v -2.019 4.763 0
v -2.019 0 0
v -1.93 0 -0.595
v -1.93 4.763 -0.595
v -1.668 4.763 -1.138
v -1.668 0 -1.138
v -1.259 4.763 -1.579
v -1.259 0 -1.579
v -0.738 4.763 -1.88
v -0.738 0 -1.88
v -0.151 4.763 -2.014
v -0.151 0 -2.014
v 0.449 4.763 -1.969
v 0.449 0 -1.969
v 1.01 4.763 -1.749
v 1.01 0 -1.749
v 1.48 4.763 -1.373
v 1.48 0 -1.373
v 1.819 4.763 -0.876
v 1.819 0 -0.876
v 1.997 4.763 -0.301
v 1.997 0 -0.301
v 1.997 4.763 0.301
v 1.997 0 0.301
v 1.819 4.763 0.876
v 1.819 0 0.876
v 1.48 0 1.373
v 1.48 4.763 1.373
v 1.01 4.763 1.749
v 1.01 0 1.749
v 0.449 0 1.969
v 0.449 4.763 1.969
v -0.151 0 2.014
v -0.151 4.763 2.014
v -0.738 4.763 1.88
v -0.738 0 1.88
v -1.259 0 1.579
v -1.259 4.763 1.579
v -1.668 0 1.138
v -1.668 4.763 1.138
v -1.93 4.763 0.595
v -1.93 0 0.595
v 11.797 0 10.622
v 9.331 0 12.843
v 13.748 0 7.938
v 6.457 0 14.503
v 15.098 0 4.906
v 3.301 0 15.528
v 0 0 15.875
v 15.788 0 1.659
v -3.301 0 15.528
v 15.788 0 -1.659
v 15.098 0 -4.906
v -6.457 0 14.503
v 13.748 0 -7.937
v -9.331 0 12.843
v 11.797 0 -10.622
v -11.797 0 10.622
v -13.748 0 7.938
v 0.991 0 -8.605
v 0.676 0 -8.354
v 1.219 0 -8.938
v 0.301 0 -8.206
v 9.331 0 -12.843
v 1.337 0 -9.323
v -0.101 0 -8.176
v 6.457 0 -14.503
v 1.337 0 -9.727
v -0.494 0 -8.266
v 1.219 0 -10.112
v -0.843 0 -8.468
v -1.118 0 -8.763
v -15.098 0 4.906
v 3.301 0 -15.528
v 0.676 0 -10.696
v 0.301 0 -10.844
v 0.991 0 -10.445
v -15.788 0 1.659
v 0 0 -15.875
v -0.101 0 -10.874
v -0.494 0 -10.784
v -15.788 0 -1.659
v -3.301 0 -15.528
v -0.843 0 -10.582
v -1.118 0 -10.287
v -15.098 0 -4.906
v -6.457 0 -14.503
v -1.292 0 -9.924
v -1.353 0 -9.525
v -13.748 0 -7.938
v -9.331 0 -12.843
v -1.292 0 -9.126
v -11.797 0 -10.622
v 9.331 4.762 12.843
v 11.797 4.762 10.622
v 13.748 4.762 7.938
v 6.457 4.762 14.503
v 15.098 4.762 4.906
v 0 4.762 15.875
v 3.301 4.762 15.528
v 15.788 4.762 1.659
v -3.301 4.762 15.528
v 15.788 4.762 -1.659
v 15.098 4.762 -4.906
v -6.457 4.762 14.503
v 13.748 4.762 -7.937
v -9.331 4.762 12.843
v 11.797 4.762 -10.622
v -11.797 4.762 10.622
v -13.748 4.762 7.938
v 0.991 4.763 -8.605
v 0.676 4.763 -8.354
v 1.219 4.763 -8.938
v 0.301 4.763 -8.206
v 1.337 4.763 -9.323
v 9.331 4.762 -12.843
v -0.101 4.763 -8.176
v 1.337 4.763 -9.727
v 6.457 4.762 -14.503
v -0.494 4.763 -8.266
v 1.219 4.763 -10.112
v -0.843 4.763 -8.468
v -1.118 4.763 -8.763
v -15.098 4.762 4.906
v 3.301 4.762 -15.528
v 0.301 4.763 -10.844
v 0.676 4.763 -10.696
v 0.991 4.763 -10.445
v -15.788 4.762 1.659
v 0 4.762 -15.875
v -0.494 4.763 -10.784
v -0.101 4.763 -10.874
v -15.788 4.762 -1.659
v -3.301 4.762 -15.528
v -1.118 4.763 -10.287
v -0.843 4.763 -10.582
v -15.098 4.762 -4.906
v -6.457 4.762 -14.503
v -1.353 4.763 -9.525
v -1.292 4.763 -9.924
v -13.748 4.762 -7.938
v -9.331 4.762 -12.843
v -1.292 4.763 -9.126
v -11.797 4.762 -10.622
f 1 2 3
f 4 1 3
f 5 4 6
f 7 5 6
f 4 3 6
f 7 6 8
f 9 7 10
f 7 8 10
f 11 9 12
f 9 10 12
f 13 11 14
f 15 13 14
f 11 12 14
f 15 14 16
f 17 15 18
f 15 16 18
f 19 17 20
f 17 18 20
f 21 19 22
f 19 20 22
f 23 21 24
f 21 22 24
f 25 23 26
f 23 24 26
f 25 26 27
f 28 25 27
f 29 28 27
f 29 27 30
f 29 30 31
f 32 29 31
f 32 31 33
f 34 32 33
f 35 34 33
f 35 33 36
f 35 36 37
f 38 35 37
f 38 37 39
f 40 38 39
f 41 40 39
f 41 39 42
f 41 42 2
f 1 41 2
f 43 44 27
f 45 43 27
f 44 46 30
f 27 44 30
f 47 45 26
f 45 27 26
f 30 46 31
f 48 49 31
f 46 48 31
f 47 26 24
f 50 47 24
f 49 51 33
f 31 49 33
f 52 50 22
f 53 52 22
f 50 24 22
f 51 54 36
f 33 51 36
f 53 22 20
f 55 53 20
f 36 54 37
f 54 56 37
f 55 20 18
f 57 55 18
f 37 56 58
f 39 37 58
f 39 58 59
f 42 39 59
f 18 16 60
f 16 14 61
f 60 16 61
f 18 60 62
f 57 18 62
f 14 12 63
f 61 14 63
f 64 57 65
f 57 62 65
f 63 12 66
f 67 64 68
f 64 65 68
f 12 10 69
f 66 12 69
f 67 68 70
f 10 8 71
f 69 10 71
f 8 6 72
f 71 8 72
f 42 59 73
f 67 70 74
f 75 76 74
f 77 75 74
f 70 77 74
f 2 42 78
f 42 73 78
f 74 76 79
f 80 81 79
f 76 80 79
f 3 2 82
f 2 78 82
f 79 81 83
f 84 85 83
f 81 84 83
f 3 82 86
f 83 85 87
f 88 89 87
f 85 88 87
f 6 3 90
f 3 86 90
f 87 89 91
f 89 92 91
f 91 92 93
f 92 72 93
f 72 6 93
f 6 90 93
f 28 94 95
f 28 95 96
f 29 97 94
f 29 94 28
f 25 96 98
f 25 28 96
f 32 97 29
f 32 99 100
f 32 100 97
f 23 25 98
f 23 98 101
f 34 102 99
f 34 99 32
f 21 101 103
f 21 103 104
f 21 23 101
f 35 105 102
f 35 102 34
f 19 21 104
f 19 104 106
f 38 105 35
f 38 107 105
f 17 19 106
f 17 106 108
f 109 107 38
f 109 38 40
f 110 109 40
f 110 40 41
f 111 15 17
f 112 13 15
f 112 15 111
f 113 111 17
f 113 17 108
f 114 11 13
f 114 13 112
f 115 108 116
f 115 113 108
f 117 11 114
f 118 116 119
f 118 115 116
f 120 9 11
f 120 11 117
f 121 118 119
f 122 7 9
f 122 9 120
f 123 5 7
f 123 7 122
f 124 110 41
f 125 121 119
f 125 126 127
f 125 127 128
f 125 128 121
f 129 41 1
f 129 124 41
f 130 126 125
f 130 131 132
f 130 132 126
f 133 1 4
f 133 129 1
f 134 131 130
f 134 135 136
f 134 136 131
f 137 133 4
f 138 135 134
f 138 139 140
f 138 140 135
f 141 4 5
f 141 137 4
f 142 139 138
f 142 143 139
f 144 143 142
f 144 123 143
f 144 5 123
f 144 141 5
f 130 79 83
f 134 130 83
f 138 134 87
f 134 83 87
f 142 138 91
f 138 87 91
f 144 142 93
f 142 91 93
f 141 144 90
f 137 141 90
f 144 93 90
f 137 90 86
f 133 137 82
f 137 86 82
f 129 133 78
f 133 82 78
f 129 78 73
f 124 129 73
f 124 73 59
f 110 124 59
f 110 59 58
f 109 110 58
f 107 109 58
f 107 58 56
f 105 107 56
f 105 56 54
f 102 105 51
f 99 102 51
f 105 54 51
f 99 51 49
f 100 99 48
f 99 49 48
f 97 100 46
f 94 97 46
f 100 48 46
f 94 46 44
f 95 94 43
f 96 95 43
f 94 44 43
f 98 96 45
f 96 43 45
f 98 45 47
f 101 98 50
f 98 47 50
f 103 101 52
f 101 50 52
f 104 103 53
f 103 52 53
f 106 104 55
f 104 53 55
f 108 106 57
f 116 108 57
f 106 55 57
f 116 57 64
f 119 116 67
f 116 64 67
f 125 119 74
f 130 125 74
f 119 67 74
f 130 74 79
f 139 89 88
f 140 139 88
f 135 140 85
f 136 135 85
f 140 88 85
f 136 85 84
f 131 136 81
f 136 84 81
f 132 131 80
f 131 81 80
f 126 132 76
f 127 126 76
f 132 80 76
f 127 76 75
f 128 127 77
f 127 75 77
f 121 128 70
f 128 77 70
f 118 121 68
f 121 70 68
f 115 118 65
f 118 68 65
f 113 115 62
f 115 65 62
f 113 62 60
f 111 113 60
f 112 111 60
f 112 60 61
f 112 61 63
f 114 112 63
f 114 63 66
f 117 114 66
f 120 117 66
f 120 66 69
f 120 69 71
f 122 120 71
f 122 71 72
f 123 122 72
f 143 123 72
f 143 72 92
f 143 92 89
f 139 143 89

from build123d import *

# Parameters (mm, degrees)
SKETCH1_R              = 15.875
BOSS_EXTRUDE1_DEPTH    = 4.7625
F_10_32_TAPPED_HOLE1_D = 4.0386
F_6_32_TAPPED_HOLE1_D  = 2.7051


with BuildPart() as part:
    # Sketch1 → Boss-Extrude1 (new body)
    with BuildSketch(Plane(origin=(0, 0, 0), x_dir=(1, 0, 0), z_dir=(0, 1, 0))):
        with Locations(Location((0, 0, 0), (0, 0, 90))):
            Circle(SKETCH1_R)
    extrude(amount=BOSS_EXTRUDE1_DEPTH)

    # #10-32 Tapped Hole1 (through all)
    with Locations(Plane(origin=(0, 4.7625, 0), x_dir=(1, 0, 0), z_dir=(0, 1, 0))):
        with Locations((0, 0)):
            Hole(F_10_32_TAPPED_HOLE1_D / 2)

    # #6-32 Tapped Hole1 (through all)
    with Locations(Plane(origin=(0, 4.7625, 0), x_dir=(1, 0, 0), z_dir=(0, 1, 0))):
        with Locations((0, 9.525)):
            Hole(F_6_32_TAPPED_HOLE1_D / 2)


solid = part.part
